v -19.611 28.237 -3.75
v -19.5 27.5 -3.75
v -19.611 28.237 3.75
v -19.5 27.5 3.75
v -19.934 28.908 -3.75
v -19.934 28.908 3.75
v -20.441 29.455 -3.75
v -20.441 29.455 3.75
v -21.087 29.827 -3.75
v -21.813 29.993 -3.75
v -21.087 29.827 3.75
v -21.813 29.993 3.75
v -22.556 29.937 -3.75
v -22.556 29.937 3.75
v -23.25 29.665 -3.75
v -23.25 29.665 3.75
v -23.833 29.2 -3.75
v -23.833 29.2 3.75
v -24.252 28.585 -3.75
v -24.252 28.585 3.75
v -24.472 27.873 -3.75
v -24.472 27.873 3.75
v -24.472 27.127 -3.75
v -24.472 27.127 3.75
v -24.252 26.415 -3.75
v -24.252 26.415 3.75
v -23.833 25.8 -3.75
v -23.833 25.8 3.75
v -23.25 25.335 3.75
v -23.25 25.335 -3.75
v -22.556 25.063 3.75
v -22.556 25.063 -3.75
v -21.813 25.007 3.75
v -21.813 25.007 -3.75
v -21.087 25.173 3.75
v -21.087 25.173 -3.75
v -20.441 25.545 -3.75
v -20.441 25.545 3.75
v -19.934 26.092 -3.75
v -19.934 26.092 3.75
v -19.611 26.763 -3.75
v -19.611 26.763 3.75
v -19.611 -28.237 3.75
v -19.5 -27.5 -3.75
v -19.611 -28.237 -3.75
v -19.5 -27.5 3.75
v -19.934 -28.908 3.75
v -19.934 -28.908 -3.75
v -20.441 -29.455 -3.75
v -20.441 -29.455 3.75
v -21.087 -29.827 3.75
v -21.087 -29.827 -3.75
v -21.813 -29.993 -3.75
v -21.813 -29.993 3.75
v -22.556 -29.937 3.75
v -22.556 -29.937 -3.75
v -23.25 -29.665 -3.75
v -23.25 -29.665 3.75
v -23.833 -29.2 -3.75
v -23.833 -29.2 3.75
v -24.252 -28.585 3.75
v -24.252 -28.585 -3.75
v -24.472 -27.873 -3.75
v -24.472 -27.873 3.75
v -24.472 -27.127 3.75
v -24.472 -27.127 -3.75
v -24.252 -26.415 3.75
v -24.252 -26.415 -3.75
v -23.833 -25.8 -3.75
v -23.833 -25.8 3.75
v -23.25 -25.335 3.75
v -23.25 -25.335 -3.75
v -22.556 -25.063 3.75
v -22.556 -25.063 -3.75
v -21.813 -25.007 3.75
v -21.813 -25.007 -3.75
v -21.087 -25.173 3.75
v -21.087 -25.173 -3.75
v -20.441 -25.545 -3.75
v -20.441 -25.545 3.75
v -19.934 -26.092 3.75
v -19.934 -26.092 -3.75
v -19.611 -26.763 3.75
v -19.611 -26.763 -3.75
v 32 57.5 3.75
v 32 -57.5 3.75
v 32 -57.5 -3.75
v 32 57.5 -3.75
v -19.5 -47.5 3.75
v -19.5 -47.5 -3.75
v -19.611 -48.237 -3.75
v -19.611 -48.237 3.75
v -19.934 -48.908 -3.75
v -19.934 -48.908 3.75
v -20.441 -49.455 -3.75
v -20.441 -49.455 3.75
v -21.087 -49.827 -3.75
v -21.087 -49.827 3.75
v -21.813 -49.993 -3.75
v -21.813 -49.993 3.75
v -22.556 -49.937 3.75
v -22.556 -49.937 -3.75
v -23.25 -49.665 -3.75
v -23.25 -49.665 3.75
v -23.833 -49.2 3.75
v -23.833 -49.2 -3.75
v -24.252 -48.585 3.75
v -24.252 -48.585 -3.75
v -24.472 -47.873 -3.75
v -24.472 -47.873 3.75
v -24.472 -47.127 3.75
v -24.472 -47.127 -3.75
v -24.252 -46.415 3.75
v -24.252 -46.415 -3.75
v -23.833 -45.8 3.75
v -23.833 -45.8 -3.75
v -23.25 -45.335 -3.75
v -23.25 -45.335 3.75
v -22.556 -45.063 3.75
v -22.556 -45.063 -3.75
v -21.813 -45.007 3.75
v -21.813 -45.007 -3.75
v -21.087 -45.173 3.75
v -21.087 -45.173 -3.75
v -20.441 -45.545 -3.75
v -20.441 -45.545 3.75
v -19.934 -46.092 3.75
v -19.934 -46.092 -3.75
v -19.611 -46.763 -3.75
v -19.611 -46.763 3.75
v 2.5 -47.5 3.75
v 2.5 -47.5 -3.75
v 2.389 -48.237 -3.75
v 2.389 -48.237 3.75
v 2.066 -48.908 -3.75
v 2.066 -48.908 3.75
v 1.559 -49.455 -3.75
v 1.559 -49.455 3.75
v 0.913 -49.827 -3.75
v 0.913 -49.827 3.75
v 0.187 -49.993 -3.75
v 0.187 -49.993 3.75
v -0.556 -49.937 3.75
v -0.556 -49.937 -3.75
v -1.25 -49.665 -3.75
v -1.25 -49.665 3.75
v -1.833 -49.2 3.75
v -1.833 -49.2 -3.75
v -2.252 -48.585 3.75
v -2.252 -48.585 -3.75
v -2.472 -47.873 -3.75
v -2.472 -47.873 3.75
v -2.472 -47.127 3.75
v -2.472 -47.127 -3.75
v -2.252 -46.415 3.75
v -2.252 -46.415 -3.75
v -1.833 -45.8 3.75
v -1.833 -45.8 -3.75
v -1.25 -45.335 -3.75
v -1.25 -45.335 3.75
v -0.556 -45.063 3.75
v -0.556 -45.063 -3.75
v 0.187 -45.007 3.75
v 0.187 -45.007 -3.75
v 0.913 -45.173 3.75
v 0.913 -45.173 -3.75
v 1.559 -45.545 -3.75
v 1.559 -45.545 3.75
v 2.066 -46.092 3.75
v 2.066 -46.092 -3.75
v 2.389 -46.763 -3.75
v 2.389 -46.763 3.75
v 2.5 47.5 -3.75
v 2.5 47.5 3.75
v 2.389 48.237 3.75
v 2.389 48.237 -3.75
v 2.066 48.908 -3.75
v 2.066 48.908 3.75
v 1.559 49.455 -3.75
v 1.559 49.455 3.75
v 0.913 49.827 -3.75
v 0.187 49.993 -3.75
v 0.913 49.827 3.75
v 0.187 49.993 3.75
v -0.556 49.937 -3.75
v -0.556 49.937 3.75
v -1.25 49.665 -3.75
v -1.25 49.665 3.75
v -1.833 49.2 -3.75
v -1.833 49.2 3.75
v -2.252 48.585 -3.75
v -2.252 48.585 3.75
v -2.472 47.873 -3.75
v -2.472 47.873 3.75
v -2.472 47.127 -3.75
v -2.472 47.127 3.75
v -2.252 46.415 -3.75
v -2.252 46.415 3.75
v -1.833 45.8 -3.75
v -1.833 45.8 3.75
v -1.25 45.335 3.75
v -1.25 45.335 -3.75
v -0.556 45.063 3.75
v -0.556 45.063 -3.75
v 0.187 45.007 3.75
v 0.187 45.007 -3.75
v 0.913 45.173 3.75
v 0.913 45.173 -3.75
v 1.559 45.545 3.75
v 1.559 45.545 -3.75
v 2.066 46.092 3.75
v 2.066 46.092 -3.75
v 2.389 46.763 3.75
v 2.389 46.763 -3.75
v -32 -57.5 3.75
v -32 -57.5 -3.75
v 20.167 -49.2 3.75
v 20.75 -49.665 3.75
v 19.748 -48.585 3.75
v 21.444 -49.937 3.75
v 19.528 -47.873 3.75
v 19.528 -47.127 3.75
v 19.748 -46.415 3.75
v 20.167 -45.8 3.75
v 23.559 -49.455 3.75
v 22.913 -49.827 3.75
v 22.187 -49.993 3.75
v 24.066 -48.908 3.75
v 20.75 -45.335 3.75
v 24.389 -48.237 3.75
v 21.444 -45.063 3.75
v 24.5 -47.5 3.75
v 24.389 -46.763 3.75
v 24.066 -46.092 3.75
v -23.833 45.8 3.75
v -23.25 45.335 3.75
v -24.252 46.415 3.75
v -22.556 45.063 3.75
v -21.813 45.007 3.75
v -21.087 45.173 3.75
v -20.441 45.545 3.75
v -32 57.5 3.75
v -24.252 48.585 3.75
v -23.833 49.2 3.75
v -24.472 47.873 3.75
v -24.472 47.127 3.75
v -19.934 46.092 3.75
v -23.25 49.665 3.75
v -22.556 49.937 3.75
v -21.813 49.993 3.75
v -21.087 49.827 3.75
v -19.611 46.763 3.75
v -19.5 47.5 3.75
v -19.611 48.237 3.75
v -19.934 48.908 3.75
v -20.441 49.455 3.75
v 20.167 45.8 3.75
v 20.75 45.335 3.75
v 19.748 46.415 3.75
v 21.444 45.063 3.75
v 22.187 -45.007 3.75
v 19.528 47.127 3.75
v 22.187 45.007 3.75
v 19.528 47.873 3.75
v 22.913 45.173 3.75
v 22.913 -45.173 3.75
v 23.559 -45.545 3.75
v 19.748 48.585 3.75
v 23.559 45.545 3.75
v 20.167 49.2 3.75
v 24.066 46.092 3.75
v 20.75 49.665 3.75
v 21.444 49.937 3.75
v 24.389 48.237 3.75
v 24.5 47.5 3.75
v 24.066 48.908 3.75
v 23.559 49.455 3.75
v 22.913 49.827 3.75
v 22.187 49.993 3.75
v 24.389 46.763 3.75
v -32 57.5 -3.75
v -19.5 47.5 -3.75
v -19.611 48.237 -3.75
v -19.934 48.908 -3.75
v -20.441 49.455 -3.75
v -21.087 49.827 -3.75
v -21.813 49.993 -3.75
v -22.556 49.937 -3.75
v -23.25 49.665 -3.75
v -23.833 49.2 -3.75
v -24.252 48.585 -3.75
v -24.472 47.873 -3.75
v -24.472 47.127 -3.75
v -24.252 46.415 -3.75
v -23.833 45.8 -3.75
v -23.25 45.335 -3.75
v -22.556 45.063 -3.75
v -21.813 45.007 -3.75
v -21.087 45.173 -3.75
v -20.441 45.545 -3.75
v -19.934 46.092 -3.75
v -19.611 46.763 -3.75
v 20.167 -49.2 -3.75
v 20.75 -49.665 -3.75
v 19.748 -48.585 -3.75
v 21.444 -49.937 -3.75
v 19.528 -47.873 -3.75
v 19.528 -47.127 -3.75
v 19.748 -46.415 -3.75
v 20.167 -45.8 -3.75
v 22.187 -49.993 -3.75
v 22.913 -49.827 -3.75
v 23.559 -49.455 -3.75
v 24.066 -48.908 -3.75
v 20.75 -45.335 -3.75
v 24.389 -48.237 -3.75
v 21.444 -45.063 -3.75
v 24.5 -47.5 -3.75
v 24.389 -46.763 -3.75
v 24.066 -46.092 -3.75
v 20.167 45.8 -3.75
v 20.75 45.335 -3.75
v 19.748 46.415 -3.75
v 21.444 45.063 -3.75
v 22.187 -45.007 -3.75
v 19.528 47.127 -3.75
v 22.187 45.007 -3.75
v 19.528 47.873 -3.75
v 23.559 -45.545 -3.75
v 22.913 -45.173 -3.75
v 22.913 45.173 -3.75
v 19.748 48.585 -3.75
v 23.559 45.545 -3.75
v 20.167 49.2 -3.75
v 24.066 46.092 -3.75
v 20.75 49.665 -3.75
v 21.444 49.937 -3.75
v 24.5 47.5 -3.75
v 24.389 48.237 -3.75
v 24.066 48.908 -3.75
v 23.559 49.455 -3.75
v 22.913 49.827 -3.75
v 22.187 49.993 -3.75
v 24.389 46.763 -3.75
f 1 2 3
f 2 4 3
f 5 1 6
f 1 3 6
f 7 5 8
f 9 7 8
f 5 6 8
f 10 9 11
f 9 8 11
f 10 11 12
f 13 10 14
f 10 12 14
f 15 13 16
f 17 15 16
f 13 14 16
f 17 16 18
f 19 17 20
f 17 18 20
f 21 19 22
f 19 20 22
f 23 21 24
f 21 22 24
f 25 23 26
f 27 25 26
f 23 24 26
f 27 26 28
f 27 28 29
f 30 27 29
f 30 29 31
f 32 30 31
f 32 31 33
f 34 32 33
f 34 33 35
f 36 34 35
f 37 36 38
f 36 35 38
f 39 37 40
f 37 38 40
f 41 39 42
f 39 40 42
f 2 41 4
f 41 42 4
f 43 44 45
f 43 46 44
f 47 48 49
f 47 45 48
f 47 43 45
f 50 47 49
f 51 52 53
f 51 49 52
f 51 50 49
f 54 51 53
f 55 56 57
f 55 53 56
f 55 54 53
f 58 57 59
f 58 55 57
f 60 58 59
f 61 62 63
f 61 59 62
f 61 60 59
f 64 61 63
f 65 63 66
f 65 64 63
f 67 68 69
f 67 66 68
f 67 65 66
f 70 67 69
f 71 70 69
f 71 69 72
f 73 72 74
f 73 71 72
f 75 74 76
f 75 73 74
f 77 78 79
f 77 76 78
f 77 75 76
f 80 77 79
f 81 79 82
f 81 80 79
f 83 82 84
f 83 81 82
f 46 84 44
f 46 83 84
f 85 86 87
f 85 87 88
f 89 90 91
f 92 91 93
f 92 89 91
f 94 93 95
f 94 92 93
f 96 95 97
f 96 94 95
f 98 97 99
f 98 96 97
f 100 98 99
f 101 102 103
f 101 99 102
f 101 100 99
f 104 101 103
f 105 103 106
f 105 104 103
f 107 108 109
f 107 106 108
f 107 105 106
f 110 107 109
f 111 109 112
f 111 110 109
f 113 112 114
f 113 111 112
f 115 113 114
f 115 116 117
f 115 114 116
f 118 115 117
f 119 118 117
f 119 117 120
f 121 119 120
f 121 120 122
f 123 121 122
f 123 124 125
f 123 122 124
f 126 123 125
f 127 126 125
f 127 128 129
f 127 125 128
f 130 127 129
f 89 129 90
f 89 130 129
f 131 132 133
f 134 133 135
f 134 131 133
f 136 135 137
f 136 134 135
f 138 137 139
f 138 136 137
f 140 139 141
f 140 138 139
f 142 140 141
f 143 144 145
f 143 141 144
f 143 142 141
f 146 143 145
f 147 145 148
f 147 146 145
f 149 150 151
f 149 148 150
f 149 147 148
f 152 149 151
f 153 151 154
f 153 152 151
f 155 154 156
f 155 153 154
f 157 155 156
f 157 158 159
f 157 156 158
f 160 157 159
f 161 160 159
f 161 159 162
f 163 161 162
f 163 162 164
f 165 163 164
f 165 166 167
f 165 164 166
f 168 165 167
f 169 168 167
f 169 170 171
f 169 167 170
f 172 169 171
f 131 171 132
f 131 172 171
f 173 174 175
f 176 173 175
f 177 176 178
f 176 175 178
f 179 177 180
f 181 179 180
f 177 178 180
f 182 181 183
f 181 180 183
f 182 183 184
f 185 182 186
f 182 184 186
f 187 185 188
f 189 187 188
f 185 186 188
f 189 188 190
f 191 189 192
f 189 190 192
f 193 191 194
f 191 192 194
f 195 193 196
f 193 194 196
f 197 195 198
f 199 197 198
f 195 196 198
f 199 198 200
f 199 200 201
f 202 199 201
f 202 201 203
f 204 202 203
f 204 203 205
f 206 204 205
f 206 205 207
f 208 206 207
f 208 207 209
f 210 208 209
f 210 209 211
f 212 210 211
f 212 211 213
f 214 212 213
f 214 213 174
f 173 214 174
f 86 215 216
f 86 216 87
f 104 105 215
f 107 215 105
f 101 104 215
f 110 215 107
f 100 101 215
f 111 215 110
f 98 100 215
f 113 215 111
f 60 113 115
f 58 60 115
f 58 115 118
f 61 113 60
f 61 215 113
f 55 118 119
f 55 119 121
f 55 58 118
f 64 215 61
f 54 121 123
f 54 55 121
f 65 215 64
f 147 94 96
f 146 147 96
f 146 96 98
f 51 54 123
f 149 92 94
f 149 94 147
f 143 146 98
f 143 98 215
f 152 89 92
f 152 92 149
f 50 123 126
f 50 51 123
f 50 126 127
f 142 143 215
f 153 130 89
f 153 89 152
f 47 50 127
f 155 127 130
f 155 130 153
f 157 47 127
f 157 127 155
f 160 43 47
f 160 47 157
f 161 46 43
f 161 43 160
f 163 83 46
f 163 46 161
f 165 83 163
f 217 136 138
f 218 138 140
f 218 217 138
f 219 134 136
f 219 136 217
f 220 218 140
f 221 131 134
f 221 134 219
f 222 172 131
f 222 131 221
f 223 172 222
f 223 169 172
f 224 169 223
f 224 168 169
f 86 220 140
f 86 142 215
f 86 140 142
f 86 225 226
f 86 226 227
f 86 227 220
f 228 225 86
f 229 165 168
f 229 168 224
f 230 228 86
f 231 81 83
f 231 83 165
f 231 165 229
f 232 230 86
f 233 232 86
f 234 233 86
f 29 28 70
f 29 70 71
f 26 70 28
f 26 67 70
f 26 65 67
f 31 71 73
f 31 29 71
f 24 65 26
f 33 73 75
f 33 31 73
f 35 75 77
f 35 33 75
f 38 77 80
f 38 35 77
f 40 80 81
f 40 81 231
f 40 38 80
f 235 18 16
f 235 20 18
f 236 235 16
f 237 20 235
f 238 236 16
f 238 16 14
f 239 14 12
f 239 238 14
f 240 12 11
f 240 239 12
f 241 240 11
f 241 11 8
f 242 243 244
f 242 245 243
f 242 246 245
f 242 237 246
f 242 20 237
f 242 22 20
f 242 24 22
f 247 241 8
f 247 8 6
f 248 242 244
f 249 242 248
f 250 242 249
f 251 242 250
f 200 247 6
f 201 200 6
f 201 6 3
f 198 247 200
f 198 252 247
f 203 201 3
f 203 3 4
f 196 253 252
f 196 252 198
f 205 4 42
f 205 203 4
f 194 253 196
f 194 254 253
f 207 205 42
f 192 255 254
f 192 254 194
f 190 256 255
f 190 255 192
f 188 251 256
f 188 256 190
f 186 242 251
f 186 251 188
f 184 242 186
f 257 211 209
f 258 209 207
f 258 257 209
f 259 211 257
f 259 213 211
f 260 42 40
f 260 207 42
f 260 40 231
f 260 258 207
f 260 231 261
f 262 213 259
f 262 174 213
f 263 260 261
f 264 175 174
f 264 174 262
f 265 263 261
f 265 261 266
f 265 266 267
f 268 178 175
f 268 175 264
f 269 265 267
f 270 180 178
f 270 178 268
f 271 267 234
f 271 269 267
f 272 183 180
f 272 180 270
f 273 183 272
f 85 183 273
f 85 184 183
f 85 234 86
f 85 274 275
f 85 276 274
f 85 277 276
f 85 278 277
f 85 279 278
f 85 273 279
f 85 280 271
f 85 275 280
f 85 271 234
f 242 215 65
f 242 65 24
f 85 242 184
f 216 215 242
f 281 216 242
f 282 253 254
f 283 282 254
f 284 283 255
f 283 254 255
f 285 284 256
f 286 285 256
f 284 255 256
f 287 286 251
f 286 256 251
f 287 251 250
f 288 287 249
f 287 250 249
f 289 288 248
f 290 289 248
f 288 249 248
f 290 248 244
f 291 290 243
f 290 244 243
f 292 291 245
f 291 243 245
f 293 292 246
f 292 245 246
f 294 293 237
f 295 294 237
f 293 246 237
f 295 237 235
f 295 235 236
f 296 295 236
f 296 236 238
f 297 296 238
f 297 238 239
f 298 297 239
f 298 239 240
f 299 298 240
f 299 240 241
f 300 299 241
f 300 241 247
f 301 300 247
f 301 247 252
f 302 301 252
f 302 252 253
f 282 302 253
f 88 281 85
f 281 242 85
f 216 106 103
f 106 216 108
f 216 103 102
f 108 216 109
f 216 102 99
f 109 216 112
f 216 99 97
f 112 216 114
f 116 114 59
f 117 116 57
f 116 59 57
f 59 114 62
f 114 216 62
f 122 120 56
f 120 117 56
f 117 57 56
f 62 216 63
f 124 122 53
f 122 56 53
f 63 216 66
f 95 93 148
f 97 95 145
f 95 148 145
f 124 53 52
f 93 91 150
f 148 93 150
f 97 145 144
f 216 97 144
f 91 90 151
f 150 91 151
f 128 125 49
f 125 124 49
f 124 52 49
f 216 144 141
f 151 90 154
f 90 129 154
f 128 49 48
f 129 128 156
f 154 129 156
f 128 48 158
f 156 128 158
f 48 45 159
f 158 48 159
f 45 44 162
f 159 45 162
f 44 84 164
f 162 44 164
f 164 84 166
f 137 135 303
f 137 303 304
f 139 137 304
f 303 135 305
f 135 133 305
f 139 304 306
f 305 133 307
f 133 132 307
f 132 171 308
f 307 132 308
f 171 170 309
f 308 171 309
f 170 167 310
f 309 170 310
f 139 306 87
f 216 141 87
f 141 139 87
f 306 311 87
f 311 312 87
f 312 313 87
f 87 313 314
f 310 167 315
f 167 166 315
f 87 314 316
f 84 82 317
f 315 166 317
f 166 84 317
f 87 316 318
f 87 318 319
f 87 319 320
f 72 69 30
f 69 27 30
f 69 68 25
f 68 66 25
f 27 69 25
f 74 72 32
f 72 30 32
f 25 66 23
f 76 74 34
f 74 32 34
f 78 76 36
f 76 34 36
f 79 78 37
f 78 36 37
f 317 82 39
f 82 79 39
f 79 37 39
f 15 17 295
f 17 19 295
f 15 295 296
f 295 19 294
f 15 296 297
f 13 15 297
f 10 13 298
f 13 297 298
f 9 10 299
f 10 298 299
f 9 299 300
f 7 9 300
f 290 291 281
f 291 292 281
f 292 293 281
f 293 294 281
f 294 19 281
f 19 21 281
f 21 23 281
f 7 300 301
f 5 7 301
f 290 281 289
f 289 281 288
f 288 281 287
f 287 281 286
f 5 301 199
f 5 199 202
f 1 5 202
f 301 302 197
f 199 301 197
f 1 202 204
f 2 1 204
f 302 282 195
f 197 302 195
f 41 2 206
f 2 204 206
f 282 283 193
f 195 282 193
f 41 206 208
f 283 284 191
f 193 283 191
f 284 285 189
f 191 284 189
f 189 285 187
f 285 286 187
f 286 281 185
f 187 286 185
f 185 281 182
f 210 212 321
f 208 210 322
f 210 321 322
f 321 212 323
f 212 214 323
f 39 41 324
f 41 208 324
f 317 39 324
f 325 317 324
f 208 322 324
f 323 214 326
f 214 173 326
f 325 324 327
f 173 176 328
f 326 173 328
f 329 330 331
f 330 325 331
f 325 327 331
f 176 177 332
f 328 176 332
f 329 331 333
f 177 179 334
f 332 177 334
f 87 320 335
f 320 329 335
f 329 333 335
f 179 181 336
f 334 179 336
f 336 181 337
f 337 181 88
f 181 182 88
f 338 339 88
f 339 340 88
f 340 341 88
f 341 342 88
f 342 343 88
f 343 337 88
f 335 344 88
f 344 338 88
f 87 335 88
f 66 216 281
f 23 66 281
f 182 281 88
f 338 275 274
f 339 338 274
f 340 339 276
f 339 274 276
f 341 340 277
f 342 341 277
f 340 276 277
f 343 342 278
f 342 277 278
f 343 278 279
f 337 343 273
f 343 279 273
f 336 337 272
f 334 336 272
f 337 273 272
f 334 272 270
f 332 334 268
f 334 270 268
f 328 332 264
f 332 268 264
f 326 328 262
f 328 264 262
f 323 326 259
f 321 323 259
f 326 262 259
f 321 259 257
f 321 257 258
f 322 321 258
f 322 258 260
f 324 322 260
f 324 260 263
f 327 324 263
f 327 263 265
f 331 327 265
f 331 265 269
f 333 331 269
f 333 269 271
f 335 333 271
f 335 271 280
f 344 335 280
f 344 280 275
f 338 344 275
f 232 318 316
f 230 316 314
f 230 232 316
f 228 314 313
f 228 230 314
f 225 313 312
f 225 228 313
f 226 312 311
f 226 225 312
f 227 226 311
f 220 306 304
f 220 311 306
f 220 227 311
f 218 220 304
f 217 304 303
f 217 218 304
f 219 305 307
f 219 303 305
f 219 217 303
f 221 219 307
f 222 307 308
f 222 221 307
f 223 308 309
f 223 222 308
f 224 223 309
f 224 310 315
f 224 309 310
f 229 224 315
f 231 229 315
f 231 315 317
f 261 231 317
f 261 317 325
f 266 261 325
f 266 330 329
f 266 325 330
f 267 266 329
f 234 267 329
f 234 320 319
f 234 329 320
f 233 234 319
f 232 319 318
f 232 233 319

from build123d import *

# Parameters (mm, degrees)
SKETCH1_W           = 64
SKETCH1_H           = 115
BOSS_EXTRUDE1_DEPTH = 3.75
SKETCH2_R           = 2.5
CUT_EXTRUDE1_DEPTH  = 67.230657554


with BuildPart() as part:
    # Sketch1 → Boss-Extrude1 (new, symmetric)
    with BuildSketch(Plane.XY):
        Rectangle(SKETCH1_W, SKETCH1_H)
    extrude(amount=BOSS_EXTRUDE1_DEPTH, both=True)

    # Sketch2 → Cut-Extrude1 (cut, symmetric)
    with BuildSketch(Plane.XY.offset(3.75)):
        with Locations((-22, 47.5)):
            Circle(SKETCH2_R)
        with Locations((0, 47.5)):
            Circle(SKETCH2_R)
        with Locations((22, 47.5)):
            Circle(SKETCH2_R)
        with Locations((-22, 27.5)):
            Circle(SKETCH2_R)
    cut_extrude1 = extrude(amount=CUT_EXTRUDE1_DEPTH, both=True, mode=Mode.SUBTRACT)

    # Mirror1: Cut-Extrude1 across plane
    add(cut_extrude1.mirror(Plane.ZX), mode=Mode.SUBTRACT)


solid = part.part
